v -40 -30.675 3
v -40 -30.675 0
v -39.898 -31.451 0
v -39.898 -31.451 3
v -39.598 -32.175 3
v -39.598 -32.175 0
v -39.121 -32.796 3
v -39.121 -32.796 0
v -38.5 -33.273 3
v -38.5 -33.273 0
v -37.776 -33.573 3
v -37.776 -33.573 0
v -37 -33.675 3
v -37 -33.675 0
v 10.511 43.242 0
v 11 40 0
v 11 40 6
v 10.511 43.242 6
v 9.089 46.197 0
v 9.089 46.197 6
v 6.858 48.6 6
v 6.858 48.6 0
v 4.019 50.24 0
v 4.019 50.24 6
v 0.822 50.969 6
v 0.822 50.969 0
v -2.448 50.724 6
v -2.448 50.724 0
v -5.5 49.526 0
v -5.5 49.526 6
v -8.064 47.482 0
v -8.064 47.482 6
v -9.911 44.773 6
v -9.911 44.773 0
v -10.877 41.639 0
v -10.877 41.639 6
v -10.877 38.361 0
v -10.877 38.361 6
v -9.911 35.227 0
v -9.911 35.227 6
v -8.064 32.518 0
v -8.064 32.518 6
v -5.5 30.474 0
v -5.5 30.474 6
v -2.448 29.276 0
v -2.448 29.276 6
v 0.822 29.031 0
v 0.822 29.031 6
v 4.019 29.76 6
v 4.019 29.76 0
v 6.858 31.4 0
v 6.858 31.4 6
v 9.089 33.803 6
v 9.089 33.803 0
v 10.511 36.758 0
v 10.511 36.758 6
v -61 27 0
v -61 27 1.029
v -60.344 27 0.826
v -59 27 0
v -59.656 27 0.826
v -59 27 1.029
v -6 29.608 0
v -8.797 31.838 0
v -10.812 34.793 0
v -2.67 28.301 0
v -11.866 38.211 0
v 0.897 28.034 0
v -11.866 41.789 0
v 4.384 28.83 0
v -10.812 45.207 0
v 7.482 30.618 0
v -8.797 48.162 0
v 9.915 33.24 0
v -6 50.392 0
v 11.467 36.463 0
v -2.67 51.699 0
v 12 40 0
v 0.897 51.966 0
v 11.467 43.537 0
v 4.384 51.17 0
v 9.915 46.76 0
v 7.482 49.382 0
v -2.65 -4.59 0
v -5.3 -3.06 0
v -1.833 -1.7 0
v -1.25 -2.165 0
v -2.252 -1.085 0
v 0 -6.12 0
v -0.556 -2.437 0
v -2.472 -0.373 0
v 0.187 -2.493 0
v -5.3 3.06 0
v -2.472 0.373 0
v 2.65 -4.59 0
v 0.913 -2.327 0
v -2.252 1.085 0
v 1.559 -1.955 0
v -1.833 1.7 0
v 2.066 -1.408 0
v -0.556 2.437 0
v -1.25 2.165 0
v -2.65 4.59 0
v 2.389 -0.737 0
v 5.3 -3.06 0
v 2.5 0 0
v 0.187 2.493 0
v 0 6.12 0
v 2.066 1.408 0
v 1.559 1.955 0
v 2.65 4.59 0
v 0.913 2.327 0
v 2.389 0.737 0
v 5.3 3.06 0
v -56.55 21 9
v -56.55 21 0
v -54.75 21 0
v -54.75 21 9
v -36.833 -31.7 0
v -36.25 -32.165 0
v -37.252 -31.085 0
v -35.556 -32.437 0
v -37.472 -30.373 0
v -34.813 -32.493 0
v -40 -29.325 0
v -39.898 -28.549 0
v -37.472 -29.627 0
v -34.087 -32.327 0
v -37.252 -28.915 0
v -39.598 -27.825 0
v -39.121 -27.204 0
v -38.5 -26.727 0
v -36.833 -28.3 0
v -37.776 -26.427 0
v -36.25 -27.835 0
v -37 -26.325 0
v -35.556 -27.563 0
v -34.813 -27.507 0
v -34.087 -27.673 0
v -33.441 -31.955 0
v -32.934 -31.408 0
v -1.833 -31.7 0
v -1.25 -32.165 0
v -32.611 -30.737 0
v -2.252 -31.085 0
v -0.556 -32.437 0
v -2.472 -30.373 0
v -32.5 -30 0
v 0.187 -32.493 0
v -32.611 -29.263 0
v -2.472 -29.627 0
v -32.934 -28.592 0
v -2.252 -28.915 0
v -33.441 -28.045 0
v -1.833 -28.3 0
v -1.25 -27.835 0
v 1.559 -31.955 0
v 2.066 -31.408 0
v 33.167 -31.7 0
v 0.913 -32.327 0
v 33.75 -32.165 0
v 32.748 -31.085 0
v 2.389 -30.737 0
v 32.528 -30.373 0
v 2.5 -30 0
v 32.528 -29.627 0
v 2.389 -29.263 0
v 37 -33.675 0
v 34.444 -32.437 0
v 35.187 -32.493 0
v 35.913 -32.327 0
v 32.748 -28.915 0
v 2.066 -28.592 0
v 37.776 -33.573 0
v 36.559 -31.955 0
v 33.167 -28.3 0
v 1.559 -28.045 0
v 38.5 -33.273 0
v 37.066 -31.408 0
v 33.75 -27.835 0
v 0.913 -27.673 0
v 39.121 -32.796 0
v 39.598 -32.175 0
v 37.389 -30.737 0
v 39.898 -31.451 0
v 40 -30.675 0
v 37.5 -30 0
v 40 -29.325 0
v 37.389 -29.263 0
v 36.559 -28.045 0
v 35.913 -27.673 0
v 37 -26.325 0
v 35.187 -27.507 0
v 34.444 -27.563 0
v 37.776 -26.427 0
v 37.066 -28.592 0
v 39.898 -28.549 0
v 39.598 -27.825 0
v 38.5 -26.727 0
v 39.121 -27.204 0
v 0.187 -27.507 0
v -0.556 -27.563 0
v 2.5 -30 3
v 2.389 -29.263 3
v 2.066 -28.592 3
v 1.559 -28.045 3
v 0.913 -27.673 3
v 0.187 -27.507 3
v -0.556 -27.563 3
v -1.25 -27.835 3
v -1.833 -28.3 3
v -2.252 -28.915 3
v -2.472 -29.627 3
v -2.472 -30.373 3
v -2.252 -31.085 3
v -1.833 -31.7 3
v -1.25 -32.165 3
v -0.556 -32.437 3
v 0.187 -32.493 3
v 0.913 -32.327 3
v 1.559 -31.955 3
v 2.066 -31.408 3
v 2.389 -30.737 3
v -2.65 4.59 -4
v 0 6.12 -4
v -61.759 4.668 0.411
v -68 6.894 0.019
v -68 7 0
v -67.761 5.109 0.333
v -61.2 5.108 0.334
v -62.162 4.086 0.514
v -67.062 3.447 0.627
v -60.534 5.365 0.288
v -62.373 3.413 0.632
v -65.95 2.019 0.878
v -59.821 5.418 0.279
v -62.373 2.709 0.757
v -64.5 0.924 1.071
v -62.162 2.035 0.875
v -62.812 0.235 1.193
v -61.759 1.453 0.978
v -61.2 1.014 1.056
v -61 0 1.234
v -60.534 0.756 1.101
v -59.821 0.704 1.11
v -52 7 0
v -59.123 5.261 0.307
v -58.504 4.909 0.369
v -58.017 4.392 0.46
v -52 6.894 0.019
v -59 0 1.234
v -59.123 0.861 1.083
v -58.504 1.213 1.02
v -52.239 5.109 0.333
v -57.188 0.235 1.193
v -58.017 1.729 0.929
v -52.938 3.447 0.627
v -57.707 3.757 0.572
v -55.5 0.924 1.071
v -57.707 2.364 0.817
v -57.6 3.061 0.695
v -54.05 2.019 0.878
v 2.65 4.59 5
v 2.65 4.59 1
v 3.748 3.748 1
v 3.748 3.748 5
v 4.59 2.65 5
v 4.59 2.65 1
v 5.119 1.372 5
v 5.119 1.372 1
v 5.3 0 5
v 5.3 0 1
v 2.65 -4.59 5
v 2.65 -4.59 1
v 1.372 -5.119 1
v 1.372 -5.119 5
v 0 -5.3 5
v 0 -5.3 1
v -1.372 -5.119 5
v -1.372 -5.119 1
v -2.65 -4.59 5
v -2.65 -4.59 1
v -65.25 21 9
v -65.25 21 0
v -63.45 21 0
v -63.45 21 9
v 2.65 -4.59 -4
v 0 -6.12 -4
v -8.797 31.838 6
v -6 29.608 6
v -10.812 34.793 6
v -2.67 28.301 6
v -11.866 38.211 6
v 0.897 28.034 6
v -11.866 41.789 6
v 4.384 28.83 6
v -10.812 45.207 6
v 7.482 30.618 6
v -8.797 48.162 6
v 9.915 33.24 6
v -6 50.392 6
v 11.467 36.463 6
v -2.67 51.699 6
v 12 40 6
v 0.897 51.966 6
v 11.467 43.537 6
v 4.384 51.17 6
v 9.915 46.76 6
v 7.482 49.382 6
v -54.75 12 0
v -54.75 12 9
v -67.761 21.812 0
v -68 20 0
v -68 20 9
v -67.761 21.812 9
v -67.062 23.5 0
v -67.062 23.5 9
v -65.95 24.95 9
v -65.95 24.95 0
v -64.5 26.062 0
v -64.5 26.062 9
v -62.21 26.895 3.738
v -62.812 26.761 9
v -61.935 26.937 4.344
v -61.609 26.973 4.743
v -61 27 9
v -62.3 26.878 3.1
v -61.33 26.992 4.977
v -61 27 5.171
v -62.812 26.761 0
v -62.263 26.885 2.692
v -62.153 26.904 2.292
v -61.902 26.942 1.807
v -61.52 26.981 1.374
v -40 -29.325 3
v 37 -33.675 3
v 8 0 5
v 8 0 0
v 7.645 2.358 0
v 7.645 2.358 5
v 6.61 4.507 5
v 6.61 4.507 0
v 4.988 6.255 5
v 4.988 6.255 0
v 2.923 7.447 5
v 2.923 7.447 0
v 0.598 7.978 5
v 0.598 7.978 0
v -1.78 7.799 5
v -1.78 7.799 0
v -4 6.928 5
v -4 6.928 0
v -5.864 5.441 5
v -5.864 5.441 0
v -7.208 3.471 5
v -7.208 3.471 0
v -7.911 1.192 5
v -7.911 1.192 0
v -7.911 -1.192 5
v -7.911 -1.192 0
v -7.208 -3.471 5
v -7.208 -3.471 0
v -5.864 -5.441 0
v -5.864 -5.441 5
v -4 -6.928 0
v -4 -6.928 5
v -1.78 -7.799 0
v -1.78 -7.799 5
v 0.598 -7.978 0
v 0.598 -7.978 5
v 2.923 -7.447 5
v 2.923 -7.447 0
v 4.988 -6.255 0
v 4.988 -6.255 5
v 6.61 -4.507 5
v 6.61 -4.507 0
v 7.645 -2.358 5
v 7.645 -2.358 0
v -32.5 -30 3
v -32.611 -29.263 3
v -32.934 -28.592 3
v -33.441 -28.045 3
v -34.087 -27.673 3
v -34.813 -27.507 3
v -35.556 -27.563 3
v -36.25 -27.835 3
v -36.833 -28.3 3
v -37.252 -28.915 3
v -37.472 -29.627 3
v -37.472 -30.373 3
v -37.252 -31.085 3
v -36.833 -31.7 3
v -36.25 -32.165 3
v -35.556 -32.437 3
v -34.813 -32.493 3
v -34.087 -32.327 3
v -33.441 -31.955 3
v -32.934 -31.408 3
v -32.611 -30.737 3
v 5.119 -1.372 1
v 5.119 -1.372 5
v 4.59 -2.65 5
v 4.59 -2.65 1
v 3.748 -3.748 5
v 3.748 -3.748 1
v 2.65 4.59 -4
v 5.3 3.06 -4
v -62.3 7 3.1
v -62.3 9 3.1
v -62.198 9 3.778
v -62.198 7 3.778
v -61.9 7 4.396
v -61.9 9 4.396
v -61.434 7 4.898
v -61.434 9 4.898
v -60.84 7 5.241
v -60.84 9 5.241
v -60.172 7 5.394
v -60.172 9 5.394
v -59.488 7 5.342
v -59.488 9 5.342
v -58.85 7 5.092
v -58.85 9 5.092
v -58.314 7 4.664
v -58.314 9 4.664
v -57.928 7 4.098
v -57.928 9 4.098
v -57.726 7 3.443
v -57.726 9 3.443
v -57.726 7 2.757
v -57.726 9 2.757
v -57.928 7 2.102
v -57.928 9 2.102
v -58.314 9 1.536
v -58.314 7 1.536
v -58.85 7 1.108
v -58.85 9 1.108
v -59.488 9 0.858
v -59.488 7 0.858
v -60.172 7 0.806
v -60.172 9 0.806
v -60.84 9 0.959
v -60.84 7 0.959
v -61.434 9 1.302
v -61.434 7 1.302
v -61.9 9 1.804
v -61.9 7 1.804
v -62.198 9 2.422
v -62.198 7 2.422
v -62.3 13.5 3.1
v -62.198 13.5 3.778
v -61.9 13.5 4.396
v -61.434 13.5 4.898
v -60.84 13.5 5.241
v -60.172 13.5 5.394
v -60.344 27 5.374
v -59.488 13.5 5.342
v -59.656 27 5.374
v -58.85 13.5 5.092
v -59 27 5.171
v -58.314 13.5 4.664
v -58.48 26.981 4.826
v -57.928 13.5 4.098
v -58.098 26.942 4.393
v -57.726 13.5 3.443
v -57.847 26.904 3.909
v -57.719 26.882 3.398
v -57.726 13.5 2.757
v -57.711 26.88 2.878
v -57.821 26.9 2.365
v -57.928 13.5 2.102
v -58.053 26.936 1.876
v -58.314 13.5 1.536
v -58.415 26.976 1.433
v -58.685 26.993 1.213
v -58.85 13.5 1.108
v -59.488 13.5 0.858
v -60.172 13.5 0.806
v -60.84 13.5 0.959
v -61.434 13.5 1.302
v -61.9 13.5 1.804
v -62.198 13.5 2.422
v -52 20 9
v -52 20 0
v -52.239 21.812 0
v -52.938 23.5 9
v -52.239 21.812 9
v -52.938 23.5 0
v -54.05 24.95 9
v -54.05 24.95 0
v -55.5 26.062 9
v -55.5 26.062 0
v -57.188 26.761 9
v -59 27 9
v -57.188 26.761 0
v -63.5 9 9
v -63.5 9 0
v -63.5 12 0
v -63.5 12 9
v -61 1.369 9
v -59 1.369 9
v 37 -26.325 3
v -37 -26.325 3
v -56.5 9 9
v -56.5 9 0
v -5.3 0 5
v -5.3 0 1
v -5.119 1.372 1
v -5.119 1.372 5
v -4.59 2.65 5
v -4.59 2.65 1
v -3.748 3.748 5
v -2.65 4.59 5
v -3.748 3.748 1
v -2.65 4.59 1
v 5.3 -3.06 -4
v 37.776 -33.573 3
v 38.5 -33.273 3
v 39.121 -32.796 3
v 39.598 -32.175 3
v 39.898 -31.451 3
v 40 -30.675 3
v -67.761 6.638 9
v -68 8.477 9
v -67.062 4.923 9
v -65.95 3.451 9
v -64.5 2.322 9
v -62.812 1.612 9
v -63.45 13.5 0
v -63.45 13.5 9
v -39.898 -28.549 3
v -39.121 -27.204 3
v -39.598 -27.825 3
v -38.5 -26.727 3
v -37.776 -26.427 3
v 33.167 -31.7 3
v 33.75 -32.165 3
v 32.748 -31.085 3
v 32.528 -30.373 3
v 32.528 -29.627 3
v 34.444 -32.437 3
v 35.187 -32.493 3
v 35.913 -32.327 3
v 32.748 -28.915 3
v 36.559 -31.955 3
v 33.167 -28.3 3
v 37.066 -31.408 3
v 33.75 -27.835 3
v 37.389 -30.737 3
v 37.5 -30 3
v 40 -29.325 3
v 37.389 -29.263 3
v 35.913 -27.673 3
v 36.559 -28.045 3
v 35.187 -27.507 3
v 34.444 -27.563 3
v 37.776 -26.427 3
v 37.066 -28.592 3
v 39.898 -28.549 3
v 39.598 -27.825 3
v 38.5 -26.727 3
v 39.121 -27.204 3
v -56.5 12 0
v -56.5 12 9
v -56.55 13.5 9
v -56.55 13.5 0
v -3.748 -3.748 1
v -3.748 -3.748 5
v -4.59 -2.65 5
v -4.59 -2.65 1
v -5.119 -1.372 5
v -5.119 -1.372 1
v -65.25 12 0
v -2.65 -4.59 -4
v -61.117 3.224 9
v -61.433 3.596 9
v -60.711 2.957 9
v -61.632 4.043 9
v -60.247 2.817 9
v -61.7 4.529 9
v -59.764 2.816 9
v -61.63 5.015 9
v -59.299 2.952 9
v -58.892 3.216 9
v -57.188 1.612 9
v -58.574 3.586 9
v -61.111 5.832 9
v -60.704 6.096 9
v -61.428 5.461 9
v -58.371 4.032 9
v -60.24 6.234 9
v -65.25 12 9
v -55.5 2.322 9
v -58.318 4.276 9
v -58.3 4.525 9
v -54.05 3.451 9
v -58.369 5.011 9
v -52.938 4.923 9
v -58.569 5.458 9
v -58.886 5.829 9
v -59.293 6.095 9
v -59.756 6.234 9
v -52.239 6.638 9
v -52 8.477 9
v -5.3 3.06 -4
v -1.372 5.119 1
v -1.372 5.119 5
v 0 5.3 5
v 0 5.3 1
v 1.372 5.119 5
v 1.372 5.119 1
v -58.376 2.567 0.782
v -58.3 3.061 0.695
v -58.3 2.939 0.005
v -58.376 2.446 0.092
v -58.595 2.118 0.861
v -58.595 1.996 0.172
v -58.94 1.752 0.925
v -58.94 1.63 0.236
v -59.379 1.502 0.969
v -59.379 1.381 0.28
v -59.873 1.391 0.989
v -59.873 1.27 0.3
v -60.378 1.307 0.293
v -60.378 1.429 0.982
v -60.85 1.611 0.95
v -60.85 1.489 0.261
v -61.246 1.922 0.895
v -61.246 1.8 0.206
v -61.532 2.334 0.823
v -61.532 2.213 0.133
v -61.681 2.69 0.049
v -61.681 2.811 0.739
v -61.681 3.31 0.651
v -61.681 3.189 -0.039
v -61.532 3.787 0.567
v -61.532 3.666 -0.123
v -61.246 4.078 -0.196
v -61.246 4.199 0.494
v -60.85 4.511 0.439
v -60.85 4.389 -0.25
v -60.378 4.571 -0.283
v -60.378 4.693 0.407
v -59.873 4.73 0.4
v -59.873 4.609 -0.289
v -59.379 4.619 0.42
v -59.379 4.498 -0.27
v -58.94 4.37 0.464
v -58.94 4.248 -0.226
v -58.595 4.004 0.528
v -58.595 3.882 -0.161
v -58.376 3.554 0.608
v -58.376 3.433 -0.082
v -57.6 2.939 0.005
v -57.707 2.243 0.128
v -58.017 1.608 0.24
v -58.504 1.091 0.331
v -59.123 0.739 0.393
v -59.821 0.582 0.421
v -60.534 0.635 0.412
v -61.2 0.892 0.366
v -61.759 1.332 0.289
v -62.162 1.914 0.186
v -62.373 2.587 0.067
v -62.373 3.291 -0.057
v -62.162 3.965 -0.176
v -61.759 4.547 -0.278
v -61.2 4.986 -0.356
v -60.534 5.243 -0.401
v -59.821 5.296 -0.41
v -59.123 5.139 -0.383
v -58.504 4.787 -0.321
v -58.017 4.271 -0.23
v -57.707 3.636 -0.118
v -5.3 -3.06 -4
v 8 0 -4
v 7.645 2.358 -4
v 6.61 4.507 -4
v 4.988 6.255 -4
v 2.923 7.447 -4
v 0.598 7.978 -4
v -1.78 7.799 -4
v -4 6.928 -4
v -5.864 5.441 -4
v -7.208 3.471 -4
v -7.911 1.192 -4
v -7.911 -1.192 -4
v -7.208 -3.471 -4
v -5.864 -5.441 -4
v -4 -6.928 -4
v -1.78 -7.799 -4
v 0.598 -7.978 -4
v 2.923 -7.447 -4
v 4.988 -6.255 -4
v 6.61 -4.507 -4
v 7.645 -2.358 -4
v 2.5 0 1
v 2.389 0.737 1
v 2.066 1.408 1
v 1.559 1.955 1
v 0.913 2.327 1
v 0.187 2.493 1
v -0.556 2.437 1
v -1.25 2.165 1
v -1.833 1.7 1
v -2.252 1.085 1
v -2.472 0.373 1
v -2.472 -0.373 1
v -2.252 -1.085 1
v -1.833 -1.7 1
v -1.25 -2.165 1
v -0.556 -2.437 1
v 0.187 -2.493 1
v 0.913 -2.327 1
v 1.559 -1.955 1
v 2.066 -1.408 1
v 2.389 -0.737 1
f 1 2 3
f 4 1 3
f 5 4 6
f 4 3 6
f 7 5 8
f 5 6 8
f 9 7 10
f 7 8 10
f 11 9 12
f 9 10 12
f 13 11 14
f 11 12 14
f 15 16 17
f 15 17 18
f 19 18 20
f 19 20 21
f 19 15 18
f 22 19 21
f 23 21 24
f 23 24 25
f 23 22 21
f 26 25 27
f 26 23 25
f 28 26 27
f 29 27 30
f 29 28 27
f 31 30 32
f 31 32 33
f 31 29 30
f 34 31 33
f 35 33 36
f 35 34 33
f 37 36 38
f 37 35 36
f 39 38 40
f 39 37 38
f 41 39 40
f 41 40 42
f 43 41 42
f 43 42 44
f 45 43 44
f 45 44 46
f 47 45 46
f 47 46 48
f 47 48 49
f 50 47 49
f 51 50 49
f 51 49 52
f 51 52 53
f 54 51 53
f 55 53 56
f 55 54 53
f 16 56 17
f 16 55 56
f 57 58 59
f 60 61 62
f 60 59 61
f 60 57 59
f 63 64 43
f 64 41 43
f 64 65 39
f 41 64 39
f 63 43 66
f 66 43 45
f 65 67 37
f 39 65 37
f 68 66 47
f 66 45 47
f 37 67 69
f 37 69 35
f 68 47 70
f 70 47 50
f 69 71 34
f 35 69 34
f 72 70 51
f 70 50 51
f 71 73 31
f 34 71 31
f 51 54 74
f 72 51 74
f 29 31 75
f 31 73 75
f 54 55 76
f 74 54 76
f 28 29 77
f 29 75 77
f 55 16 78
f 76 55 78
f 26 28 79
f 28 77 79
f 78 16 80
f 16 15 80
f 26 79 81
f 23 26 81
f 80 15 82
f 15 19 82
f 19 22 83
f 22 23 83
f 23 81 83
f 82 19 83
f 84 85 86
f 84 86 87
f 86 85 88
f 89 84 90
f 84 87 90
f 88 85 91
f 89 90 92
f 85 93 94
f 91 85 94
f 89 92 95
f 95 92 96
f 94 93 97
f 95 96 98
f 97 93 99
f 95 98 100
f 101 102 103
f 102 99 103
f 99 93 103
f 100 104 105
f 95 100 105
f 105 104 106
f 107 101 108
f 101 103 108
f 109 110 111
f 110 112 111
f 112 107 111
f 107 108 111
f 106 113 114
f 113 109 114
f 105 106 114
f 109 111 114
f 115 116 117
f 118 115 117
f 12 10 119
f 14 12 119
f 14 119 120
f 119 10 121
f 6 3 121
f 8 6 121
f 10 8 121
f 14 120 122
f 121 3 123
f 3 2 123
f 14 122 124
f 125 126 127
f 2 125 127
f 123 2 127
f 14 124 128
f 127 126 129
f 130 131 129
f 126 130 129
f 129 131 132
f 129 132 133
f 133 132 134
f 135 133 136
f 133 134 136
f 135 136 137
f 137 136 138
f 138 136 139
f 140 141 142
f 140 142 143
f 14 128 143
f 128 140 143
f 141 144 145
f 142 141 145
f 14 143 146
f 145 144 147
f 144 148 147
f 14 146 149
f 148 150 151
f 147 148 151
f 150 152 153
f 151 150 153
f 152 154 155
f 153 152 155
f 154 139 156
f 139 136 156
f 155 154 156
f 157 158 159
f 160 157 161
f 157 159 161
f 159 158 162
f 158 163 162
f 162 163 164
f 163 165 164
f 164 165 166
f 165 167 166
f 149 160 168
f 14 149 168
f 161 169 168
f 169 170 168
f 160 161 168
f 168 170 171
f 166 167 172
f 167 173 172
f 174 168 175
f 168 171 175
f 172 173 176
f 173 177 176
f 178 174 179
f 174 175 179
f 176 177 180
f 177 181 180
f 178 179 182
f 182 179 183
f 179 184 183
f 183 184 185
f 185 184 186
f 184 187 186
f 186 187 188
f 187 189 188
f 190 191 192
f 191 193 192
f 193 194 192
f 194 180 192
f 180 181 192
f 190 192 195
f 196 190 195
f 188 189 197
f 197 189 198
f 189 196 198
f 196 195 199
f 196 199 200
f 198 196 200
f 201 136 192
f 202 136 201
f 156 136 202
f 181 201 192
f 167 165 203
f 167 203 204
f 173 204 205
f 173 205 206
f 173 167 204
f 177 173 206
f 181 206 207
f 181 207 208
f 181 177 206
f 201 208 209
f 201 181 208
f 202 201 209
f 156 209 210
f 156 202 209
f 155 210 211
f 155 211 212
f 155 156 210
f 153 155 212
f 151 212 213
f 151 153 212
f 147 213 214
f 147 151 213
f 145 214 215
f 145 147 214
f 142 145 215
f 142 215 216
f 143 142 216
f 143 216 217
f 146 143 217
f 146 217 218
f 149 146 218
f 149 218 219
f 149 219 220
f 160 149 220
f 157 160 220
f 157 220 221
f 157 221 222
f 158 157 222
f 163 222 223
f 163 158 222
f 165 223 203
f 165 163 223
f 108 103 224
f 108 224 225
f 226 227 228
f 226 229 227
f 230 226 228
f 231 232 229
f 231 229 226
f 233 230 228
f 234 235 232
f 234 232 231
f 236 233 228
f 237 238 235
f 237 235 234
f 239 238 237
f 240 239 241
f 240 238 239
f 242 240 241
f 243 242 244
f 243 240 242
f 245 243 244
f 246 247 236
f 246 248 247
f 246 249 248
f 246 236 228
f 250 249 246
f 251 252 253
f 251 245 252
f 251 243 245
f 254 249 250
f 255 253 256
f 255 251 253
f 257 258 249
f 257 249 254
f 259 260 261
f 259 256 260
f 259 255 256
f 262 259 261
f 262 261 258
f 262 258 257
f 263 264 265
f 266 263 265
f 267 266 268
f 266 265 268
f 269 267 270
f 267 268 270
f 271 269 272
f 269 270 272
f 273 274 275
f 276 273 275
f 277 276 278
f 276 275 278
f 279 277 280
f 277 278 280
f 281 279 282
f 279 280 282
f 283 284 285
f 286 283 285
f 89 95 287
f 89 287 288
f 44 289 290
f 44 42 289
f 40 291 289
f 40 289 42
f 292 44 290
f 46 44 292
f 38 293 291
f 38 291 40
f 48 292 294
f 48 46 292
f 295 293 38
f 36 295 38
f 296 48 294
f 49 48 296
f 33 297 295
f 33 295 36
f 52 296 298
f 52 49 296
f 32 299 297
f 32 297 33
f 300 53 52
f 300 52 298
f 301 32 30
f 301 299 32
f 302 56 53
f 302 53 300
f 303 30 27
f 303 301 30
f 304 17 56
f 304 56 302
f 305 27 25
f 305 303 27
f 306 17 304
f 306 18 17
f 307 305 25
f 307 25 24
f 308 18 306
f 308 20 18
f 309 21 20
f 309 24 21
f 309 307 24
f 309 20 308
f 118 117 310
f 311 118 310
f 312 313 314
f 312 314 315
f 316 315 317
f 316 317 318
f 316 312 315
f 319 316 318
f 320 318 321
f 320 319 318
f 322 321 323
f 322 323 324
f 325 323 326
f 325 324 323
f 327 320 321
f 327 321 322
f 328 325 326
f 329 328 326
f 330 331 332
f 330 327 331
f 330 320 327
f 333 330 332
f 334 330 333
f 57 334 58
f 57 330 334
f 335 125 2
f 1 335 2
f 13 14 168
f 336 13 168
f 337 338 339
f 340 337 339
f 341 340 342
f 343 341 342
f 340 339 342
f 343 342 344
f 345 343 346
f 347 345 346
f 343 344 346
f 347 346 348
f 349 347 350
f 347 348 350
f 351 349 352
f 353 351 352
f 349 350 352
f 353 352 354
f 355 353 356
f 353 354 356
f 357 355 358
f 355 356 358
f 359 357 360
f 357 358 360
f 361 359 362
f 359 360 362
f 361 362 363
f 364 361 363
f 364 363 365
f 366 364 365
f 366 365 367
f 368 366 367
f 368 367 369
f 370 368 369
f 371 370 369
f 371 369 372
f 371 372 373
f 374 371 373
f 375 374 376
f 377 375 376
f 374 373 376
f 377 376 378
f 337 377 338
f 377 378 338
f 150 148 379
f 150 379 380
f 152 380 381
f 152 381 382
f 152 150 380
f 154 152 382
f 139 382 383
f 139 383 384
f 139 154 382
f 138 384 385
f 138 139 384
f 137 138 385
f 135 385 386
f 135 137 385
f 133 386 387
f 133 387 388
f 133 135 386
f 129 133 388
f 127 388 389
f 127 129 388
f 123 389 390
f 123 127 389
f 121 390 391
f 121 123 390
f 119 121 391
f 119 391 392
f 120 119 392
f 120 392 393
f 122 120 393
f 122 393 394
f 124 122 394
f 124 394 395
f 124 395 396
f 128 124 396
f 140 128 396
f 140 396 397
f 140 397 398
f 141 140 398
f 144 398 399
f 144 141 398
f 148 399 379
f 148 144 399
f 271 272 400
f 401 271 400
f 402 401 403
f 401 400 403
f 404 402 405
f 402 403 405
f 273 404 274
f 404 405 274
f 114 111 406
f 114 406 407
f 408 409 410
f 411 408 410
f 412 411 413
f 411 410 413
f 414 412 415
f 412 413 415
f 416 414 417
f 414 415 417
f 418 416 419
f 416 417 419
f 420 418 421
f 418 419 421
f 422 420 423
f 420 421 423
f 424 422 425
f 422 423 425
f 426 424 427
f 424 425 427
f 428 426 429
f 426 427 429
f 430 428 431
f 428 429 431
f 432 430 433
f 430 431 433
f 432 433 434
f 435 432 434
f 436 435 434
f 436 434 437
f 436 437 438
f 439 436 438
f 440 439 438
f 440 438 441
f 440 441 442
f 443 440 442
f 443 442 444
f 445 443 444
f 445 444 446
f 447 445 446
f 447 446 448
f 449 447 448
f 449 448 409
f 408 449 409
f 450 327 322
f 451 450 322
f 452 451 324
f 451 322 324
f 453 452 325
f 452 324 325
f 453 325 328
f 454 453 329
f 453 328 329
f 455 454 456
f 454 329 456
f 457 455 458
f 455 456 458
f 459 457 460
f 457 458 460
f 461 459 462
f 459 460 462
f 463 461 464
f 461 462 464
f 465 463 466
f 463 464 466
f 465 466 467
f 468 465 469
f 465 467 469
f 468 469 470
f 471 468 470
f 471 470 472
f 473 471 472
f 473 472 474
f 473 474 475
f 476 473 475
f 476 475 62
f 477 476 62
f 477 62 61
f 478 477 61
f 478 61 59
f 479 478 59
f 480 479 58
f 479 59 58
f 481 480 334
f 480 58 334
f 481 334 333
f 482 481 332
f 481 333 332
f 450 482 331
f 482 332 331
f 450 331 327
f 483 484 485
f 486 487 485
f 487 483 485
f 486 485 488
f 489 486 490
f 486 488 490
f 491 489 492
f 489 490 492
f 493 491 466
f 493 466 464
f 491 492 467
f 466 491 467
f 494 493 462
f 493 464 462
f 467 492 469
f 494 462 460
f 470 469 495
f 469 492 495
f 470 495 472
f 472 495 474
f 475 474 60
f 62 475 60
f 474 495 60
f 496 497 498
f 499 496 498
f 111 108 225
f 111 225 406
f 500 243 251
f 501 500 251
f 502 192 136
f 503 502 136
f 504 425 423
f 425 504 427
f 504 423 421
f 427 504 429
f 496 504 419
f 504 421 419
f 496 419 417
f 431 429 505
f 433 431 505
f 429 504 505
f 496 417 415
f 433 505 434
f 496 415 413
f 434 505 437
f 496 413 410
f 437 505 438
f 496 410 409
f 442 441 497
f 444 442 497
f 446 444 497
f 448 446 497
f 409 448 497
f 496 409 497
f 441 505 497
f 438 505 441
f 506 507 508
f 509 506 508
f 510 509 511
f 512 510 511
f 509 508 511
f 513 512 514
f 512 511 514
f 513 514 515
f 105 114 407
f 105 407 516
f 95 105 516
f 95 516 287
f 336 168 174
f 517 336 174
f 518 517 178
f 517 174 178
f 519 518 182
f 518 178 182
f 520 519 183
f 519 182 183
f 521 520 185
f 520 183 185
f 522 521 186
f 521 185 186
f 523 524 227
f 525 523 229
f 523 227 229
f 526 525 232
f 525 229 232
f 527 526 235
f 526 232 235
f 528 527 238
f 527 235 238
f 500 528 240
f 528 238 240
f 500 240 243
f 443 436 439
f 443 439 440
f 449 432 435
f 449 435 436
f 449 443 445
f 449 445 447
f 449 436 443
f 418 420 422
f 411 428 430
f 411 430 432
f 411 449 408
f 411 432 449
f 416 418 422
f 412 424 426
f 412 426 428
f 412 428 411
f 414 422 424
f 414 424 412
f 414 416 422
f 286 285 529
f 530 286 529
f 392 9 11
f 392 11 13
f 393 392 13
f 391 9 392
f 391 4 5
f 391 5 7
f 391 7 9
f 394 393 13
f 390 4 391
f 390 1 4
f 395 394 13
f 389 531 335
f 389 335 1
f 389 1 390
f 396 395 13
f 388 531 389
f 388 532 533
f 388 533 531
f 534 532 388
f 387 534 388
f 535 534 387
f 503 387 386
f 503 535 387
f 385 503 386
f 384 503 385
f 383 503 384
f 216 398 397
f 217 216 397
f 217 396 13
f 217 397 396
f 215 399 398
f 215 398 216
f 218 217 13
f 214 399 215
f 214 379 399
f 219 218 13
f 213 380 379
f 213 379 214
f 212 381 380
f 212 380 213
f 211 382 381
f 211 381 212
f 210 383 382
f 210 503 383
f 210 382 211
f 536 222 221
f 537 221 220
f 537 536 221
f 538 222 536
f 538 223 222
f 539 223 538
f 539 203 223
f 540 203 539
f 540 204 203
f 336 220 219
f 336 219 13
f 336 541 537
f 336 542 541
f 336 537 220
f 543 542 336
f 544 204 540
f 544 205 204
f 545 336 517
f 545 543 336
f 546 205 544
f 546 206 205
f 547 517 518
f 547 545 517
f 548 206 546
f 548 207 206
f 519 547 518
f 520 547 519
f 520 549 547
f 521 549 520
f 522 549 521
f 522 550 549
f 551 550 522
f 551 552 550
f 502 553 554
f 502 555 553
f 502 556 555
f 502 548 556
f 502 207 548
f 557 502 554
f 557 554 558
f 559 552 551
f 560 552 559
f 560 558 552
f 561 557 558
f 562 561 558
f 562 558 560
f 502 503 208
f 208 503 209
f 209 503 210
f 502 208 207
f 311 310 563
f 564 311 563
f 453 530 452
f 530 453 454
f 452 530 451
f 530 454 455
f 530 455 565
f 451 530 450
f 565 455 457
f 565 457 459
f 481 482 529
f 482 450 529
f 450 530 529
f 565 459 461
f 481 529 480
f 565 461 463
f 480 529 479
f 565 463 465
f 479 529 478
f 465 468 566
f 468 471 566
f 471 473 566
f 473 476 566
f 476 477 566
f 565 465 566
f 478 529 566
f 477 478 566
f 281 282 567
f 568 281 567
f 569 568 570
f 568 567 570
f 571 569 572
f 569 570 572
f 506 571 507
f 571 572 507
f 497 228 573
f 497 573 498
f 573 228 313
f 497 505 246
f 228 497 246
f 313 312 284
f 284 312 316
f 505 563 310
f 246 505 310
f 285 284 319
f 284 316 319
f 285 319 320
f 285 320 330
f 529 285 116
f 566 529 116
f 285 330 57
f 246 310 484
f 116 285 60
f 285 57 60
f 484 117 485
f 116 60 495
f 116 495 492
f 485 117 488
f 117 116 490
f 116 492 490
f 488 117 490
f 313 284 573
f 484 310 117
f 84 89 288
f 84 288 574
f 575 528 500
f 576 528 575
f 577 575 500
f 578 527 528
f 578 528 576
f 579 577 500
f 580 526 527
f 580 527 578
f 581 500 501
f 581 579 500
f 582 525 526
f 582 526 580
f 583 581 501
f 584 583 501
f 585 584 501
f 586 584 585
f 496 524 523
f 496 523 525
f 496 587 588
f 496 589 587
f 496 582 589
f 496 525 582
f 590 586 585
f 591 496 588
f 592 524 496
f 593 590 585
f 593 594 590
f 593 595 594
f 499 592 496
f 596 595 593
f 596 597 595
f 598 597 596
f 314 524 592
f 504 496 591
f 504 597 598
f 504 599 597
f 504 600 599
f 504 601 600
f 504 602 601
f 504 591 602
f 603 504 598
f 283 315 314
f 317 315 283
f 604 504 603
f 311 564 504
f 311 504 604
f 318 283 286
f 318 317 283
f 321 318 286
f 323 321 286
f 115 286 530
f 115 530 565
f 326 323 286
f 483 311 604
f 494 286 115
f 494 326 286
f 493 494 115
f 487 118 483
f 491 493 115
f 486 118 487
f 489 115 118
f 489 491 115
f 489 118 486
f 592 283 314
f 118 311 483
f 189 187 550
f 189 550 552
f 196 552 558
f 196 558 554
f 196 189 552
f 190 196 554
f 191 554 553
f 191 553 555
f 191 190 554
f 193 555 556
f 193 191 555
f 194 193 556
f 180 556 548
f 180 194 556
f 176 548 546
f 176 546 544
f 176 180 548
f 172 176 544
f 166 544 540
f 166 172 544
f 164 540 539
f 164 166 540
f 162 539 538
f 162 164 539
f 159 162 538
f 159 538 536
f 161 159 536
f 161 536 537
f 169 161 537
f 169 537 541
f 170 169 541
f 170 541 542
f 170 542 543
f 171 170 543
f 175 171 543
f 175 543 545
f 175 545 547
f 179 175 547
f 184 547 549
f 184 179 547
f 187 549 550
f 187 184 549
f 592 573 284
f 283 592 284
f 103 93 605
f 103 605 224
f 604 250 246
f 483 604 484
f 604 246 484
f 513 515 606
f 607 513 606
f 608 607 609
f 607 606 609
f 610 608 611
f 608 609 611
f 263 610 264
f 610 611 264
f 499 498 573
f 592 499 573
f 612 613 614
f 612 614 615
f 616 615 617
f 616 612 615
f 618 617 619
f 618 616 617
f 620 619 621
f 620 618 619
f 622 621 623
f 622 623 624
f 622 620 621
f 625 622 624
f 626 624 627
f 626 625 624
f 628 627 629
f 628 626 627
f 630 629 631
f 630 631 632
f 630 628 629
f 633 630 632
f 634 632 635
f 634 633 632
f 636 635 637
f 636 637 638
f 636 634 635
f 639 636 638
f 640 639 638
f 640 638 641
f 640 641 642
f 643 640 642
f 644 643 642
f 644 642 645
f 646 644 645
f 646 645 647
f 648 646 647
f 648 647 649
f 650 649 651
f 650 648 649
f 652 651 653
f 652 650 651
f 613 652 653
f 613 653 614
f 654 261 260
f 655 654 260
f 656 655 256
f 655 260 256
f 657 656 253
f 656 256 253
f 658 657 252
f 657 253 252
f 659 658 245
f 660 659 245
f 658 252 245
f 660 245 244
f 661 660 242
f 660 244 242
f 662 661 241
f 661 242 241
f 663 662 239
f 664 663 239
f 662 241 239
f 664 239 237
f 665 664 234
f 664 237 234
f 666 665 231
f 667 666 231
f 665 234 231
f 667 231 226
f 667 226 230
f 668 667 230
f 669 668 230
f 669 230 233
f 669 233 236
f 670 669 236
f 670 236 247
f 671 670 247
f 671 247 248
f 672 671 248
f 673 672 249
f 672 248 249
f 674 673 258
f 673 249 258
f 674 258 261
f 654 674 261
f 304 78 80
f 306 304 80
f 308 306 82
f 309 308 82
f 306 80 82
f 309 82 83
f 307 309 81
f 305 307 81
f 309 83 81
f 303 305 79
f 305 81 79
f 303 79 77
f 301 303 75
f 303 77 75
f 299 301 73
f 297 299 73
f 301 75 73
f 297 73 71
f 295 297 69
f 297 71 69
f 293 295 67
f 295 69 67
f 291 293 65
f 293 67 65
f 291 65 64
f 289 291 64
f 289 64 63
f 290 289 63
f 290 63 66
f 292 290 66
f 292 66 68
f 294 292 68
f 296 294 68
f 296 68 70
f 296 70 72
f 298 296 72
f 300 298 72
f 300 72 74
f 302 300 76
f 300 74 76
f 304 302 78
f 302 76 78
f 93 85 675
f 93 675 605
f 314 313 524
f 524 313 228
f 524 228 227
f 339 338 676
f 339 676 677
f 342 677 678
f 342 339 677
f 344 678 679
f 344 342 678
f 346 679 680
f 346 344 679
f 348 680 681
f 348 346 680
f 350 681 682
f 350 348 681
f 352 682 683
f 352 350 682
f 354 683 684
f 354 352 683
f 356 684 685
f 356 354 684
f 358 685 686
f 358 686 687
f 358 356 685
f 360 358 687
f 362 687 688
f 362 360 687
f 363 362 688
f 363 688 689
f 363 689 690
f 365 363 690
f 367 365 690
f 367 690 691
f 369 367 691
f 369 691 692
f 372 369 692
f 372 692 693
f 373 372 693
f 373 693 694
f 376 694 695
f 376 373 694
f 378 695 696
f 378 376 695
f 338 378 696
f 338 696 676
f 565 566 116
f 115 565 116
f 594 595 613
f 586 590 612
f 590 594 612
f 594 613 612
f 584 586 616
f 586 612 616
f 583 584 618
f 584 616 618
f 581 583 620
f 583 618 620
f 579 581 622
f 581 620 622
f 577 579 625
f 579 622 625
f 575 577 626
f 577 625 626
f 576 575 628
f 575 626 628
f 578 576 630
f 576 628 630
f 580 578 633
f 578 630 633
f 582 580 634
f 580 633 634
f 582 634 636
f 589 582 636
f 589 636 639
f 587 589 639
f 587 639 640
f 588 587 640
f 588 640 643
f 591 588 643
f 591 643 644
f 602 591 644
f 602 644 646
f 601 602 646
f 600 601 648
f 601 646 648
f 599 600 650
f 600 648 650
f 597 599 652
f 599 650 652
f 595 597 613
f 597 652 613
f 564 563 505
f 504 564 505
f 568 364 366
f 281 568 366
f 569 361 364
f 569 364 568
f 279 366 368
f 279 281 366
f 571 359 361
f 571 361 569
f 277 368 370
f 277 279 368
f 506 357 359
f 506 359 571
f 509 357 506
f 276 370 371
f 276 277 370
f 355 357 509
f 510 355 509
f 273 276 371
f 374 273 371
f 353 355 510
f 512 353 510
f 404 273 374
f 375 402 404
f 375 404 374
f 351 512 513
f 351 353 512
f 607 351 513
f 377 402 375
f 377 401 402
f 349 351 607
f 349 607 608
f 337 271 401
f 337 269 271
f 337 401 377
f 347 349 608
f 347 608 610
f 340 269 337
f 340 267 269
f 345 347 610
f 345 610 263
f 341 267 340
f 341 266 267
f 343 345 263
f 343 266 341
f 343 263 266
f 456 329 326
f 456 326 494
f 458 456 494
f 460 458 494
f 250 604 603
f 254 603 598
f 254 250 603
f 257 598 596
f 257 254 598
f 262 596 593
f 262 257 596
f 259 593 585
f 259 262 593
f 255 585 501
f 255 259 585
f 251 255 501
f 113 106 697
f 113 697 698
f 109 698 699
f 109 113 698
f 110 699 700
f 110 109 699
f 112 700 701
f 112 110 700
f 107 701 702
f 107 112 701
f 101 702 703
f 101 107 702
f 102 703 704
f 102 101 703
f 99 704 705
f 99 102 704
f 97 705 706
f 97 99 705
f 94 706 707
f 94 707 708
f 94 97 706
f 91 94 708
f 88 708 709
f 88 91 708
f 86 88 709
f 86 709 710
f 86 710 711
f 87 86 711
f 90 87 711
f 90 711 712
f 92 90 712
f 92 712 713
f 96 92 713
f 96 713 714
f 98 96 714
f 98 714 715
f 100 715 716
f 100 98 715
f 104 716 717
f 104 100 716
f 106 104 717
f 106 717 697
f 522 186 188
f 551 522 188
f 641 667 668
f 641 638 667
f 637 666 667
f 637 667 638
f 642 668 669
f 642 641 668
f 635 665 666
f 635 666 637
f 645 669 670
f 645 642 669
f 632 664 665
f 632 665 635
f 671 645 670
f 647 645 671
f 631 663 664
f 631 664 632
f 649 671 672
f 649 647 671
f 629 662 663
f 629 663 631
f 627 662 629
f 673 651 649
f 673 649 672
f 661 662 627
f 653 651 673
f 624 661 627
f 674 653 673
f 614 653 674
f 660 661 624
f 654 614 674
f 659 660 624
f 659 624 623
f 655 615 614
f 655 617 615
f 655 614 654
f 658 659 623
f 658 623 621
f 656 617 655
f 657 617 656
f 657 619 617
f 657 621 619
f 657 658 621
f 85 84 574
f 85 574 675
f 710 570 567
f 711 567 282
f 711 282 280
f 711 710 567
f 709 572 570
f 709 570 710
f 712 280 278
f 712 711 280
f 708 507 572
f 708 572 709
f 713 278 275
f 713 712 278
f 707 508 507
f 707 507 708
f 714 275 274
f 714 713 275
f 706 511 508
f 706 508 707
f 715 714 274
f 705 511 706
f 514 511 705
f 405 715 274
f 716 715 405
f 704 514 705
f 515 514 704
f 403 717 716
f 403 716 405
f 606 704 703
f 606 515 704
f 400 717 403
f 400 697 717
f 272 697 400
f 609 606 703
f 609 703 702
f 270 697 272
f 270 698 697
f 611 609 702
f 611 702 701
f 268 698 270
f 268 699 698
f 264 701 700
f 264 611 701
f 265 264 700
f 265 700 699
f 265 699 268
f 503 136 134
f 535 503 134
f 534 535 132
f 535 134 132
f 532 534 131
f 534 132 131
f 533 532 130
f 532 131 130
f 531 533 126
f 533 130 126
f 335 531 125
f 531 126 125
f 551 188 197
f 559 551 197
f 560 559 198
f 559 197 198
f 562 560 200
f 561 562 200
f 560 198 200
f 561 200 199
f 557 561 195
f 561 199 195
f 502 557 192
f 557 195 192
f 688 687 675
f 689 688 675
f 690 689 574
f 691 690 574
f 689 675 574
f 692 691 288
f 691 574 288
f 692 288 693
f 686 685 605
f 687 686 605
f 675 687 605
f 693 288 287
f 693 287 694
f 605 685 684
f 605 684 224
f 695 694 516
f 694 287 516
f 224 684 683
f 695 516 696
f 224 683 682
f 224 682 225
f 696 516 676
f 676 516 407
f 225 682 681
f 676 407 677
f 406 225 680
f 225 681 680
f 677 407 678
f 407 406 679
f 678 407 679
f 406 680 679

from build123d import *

# Parameters (mm, degrees)
F0_R         = 8
F1_DEPTH     = 4
F2_DEPTH     = 5
F0_R_2       = 2.5
F3_DEPTH     = 1
F4_DEPTH     = 3
F0_R_3       = 12
F0_R_4       = 11
F5_DEPTH     = 6
F0_W         = 16
F0_H         = 7
F0_H_2       = 20
F6_DEPTH     = 9
F8_W         = 16
F8_H         = 7.1079862832
F8_R         = 2.4
F8_R_2       = 1.7
F9_DEPTH     = 11.0033706387
F10_DEPTH    = 16.6784377721
F11_DEPTH    = 0.7
F12_R        = 2.3
F13_DEPTH    = 20
F8_H_2       = 1.3485015869
F14_DEPTH    = 16.6784377721
F15_T1_DEPTH = 44
F15_T3_DEPTH = 42.8855097467


# Not quite as in the source:
# - a fillet or chamfer that OpenCascade refuses, or shapes differently, is made with other operations: its cross-section is extruded or revolved along the edge and cut away or added


with BuildPart() as f1:
    # F0 (on Top) → F1 (new body)
    with BuildSketch(Plane.XY):
        Circle(F0_R)
        Polygon((5.3, 3.0599564267), (5.3, 0), (5.3, -3.0599564267), (2.6500008794, -4.5899341324), (0, -6.1199128534), (-2.6500009439, -4.5899340951), (-5.3, -3.0599564267), (-5.3, 0), (-5.3, 3.0599564267), (-2.6500008588, 4.5899341442), (0, 6.1199128534), (2.6500008831, 4.5899341302), align=None, mode=Mode.SUBTRACT)
    extrude(amount=-F1_DEPTH)

    # F0 (on Top) → F2 (join)
    with BuildSketch(Plane.XY):
        Circle(F0_R)
        Polygon((5.3, 3.0599564267), (5.3, 0), (5.3, -3.0599564267), (2.6500008794, -4.5899341324), (0, -6.1199128534), (-2.6500009439, -4.5899340951), (-5.3, -3.0599564267), (-5.3, 0), (-5.3, 3.0599564267), (-2.6500008588, 4.5899341442), (0, 6.1199128534), (2.6500008831, 4.5899341302), align=None, mode=Mode.SUBTRACT)
        with BuildLine():
            Line((0, -6.1199128534), (2.6500008794, -4.5899341324))
            ThreePointArc((2.6500008794, -4.5899341324), (-3.73e-08, -5.3), (-2.6500009439, -4.5899340951))
            Line((-2.6500009439, -4.5899340951), (0, -6.1199128534))
        make_face()
        with BuildLine():
            Line((-5.3, -3.0599564267), (-2.6500009439, -4.5899340951))
            ThreePointArc((-2.6500009439, -4.5899340951), (-4.5899349125, -2.6499995281), (-5.3, 0))
            Line((-5.3, 0), (-5.3, -3.0599564267))
        make_face()
        with BuildLine():
            ThreePointArc((-5.3, 0), (-4.589934888, 2.6499995706), (-2.6500008588, 4.5899341442))
            Line((-2.6500008588, 4.5899341442), (-5.3, 3.0599564267))
            Line((-5.3, 3.0599564267), (-5.3, 0))
        make_face()
        with BuildLine():
            Line((5.3, -3.0599564267), (5.3, 0))
            ThreePointArc((5.3, 0), (4.5899348939, -2.6499995603), (2.6500008794, -4.5899341324))
            Line((2.6500008794, -4.5899341324), (5.3, -3.0599564267))
        make_face()
        with BuildLine():
            ThreePointArc((2.6500008831, 4.5899341302), (4.589934895, 2.6499995585), (5.3, 0))
            Line((5.3, 0), (5.3, 3.0599564267))
            Line((5.3, 3.0599564267), (2.6500008831, 4.5899341302))
        make_face()
        with BuildLine():
            ThreePointArc((-2.6500008588, 4.5899341442), (1.4e-08, 5.3), (2.6500008831, 4.5899341302))
            Line((2.6500008831, 4.5899341302), (0, 6.1199128534))
            Line((0, 6.1199128534), (-2.6500008588, 4.5899341442))
        make_face()
    extrude(amount=F2_DEPTH)

    # F0 (on Top) → F3 (join)
    with BuildSketch(Plane.XY):
        with BuildLine():
            ThreePointArc((2.6500008794, -4.5899341324), (4.5899348939, -2.6499995603), (5.3, 0))
            ThreePointArc((5.3, 0), (4.589934895, 2.6499995585), (2.6500008831, 4.5899341302))
            ThreePointArc((2.6500008831, 4.5899341302), (1.4e-08, 5.3), (-2.6500008588, 4.5899341442))
            ThreePointArc((-2.6500008588, 4.5899341442), (-4.589934888, 2.6499995706), (-5.3, 0))
            ThreePointArc((-5.3, 0), (-4.5899349125, -2.6499995281), (-2.6500009439, -4.5899340951))
            ThreePointArc((-2.6500009439, -4.5899340951), (-3.73e-08, -5.3), (2.6500008794, -4.5899341324))
        make_face()
        Circle(F0_R_2, mode=Mode.SUBTRACT)
    extrude(amount=F3_DEPTH)


with BuildPart() as f4:
    # F0 (on Top) → F4 (new body)
    with BuildSketch(Plane.XY):
        with BuildLine():
            Line((-37, -33.675), (37, -33.675))
            ThreePointArc((37, -33.675), (39.1213203436, -32.7963203436), (40, -30.675))
            Line((40, -30.675), (40, -29.325))
            ThreePointArc((40, -29.325), (39.1213203436, -27.2036796564), (37, -26.325))
            Line((37, -26.325), (-37, -26.325))
            ThreePointArc((-37, -26.325), (-39.1213203436, -27.2036796564), (-40, -29.325))
            Line((-40, -29.325), (-40, -30.675))
            ThreePointArc((-40, -30.675), (-39.1213203436, -32.7963203436), (-37, -33.675))
        make_face()
        with Locations((-35, -30)):
            Circle(F0_R_2, mode=Mode.SUBTRACT)
        with Locations((0, -30)):
            Circle(F0_R_2, mode=Mode.SUBTRACT)
        with Locations((35, -30)):
            Circle(F0_R_2, mode=Mode.SUBTRACT)
    extrude(amount=F4_DEPTH)


with BuildPart() as f5:
    # F0 (on Top) → F5 (new body)
    with BuildSketch(Plane.XY):
        with Locations((0, 40)):
            Circle(F0_R_3)
        with Locations((0, 40)):
            Circle(F0_R_4, mode=Mode.SUBTRACT)
    extrude(amount=F5_DEPTH)


with BuildPart() as f6:
    # F0 (on Top) → F6 (new body)
    with BuildSketch(Plane.XY):
        with Locations((-60, 3.5)):
            Rectangle(F0_W, F0_H)
        with Locations((-60, 17)):
            Rectangle(F0_W, F0_H_2)
        Polygon((-65.25, 12), (-65.25, 21), (-63.45, 21), (-63.45, 13.5), (-56.55, 13.5), (-56.55, 21), (-54.75, 21), (-54.75, 12), (-56.5, 12), (-56.5, 9), (-63.5, 9), (-63.5, 12), align=None, mode=Mode.SUBTRACT)
    extrude(amount=F6_DEPTH)

    # F8 (on line) → F9 (cut, through all)
    with BuildSketch(Plane(origin=(0, 0.2110758272, 1.1970705016), x_dir=(1, 0, 0), z_dir=(0, -0.1736481777, -0.984807753))):
        with Locations((-60, -3.3396611295)):
            Rectangle(F8_W, F8_H)
        with Locations((-60, -2.8936542711)):
            Circle(F8_R, mode=Mode.SUBTRACT)
        with Locations((-60, -2.8936542711)):
            Circle(F8_R)
        with Locations((-60, -2.8936542711)):
            Circle(F8_R_2, mode=Mode.SUBTRACT)
        with Locations((-60, -2.8936542711)):
            Circle(F8_R_2)
    extrude(amount=F9_DEPTH, mode=Mode.SUBTRACT)

    # F8 (on line) → F10 (cut, through all)
    with BuildSketch(Plane(origin=(0, 0.2110758272, 1.1970705016), x_dir=(1, 0, 0), z_dir=(0, -0.1736481777, -0.984807753))):
        with Locations((-60, -2.8936542711)):
            Circle(F8_R_2)
    extrude(amount=-F10_DEPTH, mode=Mode.SUBTRACT)

    # F8 (on line) → F11 (join)
    with BuildSketch(Plane(origin=(0, 0.2110758272, 1.1970705016), x_dir=(1, 0, 0), z_dir=(0, -0.1736481777, -0.984807753))):
        with Locations((-60, -2.8936542711)):
            Circle(F8_R)
        with Locations((-60, -2.8936542711)):
            Circle(F8_R_2, mode=Mode.SUBTRACT)
    extrude(amount=F11_DEPTH)

    # F12 (on face) → F13 (cut)
    with BuildSketch(Plane(origin=(0, 27, 0), x_dir=(-1, 0, 0), z_dir=(0, 1, 0))):
        with Locations((60, 3.1)):
            Circle(F12_R)
    extrude(amount=-F13_DEPTH, mode=Mode.SUBTRACT)

    # F8 (on line) → F14 (cut, through all)
    with BuildSketch(Plane(origin=(0, 0.2110758272, 1.1970705016), x_dir=(1, 0, 0), z_dir=(0, -0.1736481777, -0.984807753))):
        with Locations((-60, 0.8885828056)):
            Rectangle(F8_W, F8_H_2)
    extrude(amount=-F14_DEPTH, mode=Mode.SUBTRACT)

    # F15: fillet of radius 7 on 4 edges, made by hand

    # F15_s2 → F15_t1 (cut)
    with BuildSketch(Plane.XY.offset(-17.5)):
        with BuildLine():
            ThreePointArc((-52, 20), (-54.0502525317, 24.9497474683), (-59, 27))
            Line((-59, 27), (-52, 27))
            Line((-52, 27), (-52, 20))
        make_face()
        with BuildLine():
            ThreePointArc((-68, 20), (-65.9497474683, 24.9497474683), (-61, 27))
            Line((-61, 27), (-68, 27))
            Line((-68, 27), (-68, 20))
        make_face()
    extrude(amount=F15_T1_DEPTH, mode=Mode.SUBTRACT)

    # F15_s4 → F15_t3 (cut)
    with BuildSketch(Plane(origin=(0, -2.8277672819, -16.0370651761), x_dir=(1, 0, 0), z_dir=(0, 0.1736481777, 0.984807753))):
        with BuildLine():
            ThreePointArc((-52, 6.7856679879), (-54.0502525317, 1.8359205196), (-59, -0.2143320121))
            Line((-59, -0.2143320121), (-52, -0.2143320121))
            Line((-52, -0.2143320121), (-52, 6.7856679879))
        make_face()
        with BuildLine():
            ThreePointArc((-68, 6.7856679879), (-65.9497474683, 1.8359205196), (-61, -0.2143320121))
            Line((-61, -0.2143320121), (-68, -0.2143320121))
            Line((-68, -0.2143320121), (-68, 6.7856679879))
        make_face()
    extrude(amount=F15_T3_DEPTH, mode=Mode.SUBTRACT)


solid = Compound([f1.part, f4.part, f5.part, f6.part])
